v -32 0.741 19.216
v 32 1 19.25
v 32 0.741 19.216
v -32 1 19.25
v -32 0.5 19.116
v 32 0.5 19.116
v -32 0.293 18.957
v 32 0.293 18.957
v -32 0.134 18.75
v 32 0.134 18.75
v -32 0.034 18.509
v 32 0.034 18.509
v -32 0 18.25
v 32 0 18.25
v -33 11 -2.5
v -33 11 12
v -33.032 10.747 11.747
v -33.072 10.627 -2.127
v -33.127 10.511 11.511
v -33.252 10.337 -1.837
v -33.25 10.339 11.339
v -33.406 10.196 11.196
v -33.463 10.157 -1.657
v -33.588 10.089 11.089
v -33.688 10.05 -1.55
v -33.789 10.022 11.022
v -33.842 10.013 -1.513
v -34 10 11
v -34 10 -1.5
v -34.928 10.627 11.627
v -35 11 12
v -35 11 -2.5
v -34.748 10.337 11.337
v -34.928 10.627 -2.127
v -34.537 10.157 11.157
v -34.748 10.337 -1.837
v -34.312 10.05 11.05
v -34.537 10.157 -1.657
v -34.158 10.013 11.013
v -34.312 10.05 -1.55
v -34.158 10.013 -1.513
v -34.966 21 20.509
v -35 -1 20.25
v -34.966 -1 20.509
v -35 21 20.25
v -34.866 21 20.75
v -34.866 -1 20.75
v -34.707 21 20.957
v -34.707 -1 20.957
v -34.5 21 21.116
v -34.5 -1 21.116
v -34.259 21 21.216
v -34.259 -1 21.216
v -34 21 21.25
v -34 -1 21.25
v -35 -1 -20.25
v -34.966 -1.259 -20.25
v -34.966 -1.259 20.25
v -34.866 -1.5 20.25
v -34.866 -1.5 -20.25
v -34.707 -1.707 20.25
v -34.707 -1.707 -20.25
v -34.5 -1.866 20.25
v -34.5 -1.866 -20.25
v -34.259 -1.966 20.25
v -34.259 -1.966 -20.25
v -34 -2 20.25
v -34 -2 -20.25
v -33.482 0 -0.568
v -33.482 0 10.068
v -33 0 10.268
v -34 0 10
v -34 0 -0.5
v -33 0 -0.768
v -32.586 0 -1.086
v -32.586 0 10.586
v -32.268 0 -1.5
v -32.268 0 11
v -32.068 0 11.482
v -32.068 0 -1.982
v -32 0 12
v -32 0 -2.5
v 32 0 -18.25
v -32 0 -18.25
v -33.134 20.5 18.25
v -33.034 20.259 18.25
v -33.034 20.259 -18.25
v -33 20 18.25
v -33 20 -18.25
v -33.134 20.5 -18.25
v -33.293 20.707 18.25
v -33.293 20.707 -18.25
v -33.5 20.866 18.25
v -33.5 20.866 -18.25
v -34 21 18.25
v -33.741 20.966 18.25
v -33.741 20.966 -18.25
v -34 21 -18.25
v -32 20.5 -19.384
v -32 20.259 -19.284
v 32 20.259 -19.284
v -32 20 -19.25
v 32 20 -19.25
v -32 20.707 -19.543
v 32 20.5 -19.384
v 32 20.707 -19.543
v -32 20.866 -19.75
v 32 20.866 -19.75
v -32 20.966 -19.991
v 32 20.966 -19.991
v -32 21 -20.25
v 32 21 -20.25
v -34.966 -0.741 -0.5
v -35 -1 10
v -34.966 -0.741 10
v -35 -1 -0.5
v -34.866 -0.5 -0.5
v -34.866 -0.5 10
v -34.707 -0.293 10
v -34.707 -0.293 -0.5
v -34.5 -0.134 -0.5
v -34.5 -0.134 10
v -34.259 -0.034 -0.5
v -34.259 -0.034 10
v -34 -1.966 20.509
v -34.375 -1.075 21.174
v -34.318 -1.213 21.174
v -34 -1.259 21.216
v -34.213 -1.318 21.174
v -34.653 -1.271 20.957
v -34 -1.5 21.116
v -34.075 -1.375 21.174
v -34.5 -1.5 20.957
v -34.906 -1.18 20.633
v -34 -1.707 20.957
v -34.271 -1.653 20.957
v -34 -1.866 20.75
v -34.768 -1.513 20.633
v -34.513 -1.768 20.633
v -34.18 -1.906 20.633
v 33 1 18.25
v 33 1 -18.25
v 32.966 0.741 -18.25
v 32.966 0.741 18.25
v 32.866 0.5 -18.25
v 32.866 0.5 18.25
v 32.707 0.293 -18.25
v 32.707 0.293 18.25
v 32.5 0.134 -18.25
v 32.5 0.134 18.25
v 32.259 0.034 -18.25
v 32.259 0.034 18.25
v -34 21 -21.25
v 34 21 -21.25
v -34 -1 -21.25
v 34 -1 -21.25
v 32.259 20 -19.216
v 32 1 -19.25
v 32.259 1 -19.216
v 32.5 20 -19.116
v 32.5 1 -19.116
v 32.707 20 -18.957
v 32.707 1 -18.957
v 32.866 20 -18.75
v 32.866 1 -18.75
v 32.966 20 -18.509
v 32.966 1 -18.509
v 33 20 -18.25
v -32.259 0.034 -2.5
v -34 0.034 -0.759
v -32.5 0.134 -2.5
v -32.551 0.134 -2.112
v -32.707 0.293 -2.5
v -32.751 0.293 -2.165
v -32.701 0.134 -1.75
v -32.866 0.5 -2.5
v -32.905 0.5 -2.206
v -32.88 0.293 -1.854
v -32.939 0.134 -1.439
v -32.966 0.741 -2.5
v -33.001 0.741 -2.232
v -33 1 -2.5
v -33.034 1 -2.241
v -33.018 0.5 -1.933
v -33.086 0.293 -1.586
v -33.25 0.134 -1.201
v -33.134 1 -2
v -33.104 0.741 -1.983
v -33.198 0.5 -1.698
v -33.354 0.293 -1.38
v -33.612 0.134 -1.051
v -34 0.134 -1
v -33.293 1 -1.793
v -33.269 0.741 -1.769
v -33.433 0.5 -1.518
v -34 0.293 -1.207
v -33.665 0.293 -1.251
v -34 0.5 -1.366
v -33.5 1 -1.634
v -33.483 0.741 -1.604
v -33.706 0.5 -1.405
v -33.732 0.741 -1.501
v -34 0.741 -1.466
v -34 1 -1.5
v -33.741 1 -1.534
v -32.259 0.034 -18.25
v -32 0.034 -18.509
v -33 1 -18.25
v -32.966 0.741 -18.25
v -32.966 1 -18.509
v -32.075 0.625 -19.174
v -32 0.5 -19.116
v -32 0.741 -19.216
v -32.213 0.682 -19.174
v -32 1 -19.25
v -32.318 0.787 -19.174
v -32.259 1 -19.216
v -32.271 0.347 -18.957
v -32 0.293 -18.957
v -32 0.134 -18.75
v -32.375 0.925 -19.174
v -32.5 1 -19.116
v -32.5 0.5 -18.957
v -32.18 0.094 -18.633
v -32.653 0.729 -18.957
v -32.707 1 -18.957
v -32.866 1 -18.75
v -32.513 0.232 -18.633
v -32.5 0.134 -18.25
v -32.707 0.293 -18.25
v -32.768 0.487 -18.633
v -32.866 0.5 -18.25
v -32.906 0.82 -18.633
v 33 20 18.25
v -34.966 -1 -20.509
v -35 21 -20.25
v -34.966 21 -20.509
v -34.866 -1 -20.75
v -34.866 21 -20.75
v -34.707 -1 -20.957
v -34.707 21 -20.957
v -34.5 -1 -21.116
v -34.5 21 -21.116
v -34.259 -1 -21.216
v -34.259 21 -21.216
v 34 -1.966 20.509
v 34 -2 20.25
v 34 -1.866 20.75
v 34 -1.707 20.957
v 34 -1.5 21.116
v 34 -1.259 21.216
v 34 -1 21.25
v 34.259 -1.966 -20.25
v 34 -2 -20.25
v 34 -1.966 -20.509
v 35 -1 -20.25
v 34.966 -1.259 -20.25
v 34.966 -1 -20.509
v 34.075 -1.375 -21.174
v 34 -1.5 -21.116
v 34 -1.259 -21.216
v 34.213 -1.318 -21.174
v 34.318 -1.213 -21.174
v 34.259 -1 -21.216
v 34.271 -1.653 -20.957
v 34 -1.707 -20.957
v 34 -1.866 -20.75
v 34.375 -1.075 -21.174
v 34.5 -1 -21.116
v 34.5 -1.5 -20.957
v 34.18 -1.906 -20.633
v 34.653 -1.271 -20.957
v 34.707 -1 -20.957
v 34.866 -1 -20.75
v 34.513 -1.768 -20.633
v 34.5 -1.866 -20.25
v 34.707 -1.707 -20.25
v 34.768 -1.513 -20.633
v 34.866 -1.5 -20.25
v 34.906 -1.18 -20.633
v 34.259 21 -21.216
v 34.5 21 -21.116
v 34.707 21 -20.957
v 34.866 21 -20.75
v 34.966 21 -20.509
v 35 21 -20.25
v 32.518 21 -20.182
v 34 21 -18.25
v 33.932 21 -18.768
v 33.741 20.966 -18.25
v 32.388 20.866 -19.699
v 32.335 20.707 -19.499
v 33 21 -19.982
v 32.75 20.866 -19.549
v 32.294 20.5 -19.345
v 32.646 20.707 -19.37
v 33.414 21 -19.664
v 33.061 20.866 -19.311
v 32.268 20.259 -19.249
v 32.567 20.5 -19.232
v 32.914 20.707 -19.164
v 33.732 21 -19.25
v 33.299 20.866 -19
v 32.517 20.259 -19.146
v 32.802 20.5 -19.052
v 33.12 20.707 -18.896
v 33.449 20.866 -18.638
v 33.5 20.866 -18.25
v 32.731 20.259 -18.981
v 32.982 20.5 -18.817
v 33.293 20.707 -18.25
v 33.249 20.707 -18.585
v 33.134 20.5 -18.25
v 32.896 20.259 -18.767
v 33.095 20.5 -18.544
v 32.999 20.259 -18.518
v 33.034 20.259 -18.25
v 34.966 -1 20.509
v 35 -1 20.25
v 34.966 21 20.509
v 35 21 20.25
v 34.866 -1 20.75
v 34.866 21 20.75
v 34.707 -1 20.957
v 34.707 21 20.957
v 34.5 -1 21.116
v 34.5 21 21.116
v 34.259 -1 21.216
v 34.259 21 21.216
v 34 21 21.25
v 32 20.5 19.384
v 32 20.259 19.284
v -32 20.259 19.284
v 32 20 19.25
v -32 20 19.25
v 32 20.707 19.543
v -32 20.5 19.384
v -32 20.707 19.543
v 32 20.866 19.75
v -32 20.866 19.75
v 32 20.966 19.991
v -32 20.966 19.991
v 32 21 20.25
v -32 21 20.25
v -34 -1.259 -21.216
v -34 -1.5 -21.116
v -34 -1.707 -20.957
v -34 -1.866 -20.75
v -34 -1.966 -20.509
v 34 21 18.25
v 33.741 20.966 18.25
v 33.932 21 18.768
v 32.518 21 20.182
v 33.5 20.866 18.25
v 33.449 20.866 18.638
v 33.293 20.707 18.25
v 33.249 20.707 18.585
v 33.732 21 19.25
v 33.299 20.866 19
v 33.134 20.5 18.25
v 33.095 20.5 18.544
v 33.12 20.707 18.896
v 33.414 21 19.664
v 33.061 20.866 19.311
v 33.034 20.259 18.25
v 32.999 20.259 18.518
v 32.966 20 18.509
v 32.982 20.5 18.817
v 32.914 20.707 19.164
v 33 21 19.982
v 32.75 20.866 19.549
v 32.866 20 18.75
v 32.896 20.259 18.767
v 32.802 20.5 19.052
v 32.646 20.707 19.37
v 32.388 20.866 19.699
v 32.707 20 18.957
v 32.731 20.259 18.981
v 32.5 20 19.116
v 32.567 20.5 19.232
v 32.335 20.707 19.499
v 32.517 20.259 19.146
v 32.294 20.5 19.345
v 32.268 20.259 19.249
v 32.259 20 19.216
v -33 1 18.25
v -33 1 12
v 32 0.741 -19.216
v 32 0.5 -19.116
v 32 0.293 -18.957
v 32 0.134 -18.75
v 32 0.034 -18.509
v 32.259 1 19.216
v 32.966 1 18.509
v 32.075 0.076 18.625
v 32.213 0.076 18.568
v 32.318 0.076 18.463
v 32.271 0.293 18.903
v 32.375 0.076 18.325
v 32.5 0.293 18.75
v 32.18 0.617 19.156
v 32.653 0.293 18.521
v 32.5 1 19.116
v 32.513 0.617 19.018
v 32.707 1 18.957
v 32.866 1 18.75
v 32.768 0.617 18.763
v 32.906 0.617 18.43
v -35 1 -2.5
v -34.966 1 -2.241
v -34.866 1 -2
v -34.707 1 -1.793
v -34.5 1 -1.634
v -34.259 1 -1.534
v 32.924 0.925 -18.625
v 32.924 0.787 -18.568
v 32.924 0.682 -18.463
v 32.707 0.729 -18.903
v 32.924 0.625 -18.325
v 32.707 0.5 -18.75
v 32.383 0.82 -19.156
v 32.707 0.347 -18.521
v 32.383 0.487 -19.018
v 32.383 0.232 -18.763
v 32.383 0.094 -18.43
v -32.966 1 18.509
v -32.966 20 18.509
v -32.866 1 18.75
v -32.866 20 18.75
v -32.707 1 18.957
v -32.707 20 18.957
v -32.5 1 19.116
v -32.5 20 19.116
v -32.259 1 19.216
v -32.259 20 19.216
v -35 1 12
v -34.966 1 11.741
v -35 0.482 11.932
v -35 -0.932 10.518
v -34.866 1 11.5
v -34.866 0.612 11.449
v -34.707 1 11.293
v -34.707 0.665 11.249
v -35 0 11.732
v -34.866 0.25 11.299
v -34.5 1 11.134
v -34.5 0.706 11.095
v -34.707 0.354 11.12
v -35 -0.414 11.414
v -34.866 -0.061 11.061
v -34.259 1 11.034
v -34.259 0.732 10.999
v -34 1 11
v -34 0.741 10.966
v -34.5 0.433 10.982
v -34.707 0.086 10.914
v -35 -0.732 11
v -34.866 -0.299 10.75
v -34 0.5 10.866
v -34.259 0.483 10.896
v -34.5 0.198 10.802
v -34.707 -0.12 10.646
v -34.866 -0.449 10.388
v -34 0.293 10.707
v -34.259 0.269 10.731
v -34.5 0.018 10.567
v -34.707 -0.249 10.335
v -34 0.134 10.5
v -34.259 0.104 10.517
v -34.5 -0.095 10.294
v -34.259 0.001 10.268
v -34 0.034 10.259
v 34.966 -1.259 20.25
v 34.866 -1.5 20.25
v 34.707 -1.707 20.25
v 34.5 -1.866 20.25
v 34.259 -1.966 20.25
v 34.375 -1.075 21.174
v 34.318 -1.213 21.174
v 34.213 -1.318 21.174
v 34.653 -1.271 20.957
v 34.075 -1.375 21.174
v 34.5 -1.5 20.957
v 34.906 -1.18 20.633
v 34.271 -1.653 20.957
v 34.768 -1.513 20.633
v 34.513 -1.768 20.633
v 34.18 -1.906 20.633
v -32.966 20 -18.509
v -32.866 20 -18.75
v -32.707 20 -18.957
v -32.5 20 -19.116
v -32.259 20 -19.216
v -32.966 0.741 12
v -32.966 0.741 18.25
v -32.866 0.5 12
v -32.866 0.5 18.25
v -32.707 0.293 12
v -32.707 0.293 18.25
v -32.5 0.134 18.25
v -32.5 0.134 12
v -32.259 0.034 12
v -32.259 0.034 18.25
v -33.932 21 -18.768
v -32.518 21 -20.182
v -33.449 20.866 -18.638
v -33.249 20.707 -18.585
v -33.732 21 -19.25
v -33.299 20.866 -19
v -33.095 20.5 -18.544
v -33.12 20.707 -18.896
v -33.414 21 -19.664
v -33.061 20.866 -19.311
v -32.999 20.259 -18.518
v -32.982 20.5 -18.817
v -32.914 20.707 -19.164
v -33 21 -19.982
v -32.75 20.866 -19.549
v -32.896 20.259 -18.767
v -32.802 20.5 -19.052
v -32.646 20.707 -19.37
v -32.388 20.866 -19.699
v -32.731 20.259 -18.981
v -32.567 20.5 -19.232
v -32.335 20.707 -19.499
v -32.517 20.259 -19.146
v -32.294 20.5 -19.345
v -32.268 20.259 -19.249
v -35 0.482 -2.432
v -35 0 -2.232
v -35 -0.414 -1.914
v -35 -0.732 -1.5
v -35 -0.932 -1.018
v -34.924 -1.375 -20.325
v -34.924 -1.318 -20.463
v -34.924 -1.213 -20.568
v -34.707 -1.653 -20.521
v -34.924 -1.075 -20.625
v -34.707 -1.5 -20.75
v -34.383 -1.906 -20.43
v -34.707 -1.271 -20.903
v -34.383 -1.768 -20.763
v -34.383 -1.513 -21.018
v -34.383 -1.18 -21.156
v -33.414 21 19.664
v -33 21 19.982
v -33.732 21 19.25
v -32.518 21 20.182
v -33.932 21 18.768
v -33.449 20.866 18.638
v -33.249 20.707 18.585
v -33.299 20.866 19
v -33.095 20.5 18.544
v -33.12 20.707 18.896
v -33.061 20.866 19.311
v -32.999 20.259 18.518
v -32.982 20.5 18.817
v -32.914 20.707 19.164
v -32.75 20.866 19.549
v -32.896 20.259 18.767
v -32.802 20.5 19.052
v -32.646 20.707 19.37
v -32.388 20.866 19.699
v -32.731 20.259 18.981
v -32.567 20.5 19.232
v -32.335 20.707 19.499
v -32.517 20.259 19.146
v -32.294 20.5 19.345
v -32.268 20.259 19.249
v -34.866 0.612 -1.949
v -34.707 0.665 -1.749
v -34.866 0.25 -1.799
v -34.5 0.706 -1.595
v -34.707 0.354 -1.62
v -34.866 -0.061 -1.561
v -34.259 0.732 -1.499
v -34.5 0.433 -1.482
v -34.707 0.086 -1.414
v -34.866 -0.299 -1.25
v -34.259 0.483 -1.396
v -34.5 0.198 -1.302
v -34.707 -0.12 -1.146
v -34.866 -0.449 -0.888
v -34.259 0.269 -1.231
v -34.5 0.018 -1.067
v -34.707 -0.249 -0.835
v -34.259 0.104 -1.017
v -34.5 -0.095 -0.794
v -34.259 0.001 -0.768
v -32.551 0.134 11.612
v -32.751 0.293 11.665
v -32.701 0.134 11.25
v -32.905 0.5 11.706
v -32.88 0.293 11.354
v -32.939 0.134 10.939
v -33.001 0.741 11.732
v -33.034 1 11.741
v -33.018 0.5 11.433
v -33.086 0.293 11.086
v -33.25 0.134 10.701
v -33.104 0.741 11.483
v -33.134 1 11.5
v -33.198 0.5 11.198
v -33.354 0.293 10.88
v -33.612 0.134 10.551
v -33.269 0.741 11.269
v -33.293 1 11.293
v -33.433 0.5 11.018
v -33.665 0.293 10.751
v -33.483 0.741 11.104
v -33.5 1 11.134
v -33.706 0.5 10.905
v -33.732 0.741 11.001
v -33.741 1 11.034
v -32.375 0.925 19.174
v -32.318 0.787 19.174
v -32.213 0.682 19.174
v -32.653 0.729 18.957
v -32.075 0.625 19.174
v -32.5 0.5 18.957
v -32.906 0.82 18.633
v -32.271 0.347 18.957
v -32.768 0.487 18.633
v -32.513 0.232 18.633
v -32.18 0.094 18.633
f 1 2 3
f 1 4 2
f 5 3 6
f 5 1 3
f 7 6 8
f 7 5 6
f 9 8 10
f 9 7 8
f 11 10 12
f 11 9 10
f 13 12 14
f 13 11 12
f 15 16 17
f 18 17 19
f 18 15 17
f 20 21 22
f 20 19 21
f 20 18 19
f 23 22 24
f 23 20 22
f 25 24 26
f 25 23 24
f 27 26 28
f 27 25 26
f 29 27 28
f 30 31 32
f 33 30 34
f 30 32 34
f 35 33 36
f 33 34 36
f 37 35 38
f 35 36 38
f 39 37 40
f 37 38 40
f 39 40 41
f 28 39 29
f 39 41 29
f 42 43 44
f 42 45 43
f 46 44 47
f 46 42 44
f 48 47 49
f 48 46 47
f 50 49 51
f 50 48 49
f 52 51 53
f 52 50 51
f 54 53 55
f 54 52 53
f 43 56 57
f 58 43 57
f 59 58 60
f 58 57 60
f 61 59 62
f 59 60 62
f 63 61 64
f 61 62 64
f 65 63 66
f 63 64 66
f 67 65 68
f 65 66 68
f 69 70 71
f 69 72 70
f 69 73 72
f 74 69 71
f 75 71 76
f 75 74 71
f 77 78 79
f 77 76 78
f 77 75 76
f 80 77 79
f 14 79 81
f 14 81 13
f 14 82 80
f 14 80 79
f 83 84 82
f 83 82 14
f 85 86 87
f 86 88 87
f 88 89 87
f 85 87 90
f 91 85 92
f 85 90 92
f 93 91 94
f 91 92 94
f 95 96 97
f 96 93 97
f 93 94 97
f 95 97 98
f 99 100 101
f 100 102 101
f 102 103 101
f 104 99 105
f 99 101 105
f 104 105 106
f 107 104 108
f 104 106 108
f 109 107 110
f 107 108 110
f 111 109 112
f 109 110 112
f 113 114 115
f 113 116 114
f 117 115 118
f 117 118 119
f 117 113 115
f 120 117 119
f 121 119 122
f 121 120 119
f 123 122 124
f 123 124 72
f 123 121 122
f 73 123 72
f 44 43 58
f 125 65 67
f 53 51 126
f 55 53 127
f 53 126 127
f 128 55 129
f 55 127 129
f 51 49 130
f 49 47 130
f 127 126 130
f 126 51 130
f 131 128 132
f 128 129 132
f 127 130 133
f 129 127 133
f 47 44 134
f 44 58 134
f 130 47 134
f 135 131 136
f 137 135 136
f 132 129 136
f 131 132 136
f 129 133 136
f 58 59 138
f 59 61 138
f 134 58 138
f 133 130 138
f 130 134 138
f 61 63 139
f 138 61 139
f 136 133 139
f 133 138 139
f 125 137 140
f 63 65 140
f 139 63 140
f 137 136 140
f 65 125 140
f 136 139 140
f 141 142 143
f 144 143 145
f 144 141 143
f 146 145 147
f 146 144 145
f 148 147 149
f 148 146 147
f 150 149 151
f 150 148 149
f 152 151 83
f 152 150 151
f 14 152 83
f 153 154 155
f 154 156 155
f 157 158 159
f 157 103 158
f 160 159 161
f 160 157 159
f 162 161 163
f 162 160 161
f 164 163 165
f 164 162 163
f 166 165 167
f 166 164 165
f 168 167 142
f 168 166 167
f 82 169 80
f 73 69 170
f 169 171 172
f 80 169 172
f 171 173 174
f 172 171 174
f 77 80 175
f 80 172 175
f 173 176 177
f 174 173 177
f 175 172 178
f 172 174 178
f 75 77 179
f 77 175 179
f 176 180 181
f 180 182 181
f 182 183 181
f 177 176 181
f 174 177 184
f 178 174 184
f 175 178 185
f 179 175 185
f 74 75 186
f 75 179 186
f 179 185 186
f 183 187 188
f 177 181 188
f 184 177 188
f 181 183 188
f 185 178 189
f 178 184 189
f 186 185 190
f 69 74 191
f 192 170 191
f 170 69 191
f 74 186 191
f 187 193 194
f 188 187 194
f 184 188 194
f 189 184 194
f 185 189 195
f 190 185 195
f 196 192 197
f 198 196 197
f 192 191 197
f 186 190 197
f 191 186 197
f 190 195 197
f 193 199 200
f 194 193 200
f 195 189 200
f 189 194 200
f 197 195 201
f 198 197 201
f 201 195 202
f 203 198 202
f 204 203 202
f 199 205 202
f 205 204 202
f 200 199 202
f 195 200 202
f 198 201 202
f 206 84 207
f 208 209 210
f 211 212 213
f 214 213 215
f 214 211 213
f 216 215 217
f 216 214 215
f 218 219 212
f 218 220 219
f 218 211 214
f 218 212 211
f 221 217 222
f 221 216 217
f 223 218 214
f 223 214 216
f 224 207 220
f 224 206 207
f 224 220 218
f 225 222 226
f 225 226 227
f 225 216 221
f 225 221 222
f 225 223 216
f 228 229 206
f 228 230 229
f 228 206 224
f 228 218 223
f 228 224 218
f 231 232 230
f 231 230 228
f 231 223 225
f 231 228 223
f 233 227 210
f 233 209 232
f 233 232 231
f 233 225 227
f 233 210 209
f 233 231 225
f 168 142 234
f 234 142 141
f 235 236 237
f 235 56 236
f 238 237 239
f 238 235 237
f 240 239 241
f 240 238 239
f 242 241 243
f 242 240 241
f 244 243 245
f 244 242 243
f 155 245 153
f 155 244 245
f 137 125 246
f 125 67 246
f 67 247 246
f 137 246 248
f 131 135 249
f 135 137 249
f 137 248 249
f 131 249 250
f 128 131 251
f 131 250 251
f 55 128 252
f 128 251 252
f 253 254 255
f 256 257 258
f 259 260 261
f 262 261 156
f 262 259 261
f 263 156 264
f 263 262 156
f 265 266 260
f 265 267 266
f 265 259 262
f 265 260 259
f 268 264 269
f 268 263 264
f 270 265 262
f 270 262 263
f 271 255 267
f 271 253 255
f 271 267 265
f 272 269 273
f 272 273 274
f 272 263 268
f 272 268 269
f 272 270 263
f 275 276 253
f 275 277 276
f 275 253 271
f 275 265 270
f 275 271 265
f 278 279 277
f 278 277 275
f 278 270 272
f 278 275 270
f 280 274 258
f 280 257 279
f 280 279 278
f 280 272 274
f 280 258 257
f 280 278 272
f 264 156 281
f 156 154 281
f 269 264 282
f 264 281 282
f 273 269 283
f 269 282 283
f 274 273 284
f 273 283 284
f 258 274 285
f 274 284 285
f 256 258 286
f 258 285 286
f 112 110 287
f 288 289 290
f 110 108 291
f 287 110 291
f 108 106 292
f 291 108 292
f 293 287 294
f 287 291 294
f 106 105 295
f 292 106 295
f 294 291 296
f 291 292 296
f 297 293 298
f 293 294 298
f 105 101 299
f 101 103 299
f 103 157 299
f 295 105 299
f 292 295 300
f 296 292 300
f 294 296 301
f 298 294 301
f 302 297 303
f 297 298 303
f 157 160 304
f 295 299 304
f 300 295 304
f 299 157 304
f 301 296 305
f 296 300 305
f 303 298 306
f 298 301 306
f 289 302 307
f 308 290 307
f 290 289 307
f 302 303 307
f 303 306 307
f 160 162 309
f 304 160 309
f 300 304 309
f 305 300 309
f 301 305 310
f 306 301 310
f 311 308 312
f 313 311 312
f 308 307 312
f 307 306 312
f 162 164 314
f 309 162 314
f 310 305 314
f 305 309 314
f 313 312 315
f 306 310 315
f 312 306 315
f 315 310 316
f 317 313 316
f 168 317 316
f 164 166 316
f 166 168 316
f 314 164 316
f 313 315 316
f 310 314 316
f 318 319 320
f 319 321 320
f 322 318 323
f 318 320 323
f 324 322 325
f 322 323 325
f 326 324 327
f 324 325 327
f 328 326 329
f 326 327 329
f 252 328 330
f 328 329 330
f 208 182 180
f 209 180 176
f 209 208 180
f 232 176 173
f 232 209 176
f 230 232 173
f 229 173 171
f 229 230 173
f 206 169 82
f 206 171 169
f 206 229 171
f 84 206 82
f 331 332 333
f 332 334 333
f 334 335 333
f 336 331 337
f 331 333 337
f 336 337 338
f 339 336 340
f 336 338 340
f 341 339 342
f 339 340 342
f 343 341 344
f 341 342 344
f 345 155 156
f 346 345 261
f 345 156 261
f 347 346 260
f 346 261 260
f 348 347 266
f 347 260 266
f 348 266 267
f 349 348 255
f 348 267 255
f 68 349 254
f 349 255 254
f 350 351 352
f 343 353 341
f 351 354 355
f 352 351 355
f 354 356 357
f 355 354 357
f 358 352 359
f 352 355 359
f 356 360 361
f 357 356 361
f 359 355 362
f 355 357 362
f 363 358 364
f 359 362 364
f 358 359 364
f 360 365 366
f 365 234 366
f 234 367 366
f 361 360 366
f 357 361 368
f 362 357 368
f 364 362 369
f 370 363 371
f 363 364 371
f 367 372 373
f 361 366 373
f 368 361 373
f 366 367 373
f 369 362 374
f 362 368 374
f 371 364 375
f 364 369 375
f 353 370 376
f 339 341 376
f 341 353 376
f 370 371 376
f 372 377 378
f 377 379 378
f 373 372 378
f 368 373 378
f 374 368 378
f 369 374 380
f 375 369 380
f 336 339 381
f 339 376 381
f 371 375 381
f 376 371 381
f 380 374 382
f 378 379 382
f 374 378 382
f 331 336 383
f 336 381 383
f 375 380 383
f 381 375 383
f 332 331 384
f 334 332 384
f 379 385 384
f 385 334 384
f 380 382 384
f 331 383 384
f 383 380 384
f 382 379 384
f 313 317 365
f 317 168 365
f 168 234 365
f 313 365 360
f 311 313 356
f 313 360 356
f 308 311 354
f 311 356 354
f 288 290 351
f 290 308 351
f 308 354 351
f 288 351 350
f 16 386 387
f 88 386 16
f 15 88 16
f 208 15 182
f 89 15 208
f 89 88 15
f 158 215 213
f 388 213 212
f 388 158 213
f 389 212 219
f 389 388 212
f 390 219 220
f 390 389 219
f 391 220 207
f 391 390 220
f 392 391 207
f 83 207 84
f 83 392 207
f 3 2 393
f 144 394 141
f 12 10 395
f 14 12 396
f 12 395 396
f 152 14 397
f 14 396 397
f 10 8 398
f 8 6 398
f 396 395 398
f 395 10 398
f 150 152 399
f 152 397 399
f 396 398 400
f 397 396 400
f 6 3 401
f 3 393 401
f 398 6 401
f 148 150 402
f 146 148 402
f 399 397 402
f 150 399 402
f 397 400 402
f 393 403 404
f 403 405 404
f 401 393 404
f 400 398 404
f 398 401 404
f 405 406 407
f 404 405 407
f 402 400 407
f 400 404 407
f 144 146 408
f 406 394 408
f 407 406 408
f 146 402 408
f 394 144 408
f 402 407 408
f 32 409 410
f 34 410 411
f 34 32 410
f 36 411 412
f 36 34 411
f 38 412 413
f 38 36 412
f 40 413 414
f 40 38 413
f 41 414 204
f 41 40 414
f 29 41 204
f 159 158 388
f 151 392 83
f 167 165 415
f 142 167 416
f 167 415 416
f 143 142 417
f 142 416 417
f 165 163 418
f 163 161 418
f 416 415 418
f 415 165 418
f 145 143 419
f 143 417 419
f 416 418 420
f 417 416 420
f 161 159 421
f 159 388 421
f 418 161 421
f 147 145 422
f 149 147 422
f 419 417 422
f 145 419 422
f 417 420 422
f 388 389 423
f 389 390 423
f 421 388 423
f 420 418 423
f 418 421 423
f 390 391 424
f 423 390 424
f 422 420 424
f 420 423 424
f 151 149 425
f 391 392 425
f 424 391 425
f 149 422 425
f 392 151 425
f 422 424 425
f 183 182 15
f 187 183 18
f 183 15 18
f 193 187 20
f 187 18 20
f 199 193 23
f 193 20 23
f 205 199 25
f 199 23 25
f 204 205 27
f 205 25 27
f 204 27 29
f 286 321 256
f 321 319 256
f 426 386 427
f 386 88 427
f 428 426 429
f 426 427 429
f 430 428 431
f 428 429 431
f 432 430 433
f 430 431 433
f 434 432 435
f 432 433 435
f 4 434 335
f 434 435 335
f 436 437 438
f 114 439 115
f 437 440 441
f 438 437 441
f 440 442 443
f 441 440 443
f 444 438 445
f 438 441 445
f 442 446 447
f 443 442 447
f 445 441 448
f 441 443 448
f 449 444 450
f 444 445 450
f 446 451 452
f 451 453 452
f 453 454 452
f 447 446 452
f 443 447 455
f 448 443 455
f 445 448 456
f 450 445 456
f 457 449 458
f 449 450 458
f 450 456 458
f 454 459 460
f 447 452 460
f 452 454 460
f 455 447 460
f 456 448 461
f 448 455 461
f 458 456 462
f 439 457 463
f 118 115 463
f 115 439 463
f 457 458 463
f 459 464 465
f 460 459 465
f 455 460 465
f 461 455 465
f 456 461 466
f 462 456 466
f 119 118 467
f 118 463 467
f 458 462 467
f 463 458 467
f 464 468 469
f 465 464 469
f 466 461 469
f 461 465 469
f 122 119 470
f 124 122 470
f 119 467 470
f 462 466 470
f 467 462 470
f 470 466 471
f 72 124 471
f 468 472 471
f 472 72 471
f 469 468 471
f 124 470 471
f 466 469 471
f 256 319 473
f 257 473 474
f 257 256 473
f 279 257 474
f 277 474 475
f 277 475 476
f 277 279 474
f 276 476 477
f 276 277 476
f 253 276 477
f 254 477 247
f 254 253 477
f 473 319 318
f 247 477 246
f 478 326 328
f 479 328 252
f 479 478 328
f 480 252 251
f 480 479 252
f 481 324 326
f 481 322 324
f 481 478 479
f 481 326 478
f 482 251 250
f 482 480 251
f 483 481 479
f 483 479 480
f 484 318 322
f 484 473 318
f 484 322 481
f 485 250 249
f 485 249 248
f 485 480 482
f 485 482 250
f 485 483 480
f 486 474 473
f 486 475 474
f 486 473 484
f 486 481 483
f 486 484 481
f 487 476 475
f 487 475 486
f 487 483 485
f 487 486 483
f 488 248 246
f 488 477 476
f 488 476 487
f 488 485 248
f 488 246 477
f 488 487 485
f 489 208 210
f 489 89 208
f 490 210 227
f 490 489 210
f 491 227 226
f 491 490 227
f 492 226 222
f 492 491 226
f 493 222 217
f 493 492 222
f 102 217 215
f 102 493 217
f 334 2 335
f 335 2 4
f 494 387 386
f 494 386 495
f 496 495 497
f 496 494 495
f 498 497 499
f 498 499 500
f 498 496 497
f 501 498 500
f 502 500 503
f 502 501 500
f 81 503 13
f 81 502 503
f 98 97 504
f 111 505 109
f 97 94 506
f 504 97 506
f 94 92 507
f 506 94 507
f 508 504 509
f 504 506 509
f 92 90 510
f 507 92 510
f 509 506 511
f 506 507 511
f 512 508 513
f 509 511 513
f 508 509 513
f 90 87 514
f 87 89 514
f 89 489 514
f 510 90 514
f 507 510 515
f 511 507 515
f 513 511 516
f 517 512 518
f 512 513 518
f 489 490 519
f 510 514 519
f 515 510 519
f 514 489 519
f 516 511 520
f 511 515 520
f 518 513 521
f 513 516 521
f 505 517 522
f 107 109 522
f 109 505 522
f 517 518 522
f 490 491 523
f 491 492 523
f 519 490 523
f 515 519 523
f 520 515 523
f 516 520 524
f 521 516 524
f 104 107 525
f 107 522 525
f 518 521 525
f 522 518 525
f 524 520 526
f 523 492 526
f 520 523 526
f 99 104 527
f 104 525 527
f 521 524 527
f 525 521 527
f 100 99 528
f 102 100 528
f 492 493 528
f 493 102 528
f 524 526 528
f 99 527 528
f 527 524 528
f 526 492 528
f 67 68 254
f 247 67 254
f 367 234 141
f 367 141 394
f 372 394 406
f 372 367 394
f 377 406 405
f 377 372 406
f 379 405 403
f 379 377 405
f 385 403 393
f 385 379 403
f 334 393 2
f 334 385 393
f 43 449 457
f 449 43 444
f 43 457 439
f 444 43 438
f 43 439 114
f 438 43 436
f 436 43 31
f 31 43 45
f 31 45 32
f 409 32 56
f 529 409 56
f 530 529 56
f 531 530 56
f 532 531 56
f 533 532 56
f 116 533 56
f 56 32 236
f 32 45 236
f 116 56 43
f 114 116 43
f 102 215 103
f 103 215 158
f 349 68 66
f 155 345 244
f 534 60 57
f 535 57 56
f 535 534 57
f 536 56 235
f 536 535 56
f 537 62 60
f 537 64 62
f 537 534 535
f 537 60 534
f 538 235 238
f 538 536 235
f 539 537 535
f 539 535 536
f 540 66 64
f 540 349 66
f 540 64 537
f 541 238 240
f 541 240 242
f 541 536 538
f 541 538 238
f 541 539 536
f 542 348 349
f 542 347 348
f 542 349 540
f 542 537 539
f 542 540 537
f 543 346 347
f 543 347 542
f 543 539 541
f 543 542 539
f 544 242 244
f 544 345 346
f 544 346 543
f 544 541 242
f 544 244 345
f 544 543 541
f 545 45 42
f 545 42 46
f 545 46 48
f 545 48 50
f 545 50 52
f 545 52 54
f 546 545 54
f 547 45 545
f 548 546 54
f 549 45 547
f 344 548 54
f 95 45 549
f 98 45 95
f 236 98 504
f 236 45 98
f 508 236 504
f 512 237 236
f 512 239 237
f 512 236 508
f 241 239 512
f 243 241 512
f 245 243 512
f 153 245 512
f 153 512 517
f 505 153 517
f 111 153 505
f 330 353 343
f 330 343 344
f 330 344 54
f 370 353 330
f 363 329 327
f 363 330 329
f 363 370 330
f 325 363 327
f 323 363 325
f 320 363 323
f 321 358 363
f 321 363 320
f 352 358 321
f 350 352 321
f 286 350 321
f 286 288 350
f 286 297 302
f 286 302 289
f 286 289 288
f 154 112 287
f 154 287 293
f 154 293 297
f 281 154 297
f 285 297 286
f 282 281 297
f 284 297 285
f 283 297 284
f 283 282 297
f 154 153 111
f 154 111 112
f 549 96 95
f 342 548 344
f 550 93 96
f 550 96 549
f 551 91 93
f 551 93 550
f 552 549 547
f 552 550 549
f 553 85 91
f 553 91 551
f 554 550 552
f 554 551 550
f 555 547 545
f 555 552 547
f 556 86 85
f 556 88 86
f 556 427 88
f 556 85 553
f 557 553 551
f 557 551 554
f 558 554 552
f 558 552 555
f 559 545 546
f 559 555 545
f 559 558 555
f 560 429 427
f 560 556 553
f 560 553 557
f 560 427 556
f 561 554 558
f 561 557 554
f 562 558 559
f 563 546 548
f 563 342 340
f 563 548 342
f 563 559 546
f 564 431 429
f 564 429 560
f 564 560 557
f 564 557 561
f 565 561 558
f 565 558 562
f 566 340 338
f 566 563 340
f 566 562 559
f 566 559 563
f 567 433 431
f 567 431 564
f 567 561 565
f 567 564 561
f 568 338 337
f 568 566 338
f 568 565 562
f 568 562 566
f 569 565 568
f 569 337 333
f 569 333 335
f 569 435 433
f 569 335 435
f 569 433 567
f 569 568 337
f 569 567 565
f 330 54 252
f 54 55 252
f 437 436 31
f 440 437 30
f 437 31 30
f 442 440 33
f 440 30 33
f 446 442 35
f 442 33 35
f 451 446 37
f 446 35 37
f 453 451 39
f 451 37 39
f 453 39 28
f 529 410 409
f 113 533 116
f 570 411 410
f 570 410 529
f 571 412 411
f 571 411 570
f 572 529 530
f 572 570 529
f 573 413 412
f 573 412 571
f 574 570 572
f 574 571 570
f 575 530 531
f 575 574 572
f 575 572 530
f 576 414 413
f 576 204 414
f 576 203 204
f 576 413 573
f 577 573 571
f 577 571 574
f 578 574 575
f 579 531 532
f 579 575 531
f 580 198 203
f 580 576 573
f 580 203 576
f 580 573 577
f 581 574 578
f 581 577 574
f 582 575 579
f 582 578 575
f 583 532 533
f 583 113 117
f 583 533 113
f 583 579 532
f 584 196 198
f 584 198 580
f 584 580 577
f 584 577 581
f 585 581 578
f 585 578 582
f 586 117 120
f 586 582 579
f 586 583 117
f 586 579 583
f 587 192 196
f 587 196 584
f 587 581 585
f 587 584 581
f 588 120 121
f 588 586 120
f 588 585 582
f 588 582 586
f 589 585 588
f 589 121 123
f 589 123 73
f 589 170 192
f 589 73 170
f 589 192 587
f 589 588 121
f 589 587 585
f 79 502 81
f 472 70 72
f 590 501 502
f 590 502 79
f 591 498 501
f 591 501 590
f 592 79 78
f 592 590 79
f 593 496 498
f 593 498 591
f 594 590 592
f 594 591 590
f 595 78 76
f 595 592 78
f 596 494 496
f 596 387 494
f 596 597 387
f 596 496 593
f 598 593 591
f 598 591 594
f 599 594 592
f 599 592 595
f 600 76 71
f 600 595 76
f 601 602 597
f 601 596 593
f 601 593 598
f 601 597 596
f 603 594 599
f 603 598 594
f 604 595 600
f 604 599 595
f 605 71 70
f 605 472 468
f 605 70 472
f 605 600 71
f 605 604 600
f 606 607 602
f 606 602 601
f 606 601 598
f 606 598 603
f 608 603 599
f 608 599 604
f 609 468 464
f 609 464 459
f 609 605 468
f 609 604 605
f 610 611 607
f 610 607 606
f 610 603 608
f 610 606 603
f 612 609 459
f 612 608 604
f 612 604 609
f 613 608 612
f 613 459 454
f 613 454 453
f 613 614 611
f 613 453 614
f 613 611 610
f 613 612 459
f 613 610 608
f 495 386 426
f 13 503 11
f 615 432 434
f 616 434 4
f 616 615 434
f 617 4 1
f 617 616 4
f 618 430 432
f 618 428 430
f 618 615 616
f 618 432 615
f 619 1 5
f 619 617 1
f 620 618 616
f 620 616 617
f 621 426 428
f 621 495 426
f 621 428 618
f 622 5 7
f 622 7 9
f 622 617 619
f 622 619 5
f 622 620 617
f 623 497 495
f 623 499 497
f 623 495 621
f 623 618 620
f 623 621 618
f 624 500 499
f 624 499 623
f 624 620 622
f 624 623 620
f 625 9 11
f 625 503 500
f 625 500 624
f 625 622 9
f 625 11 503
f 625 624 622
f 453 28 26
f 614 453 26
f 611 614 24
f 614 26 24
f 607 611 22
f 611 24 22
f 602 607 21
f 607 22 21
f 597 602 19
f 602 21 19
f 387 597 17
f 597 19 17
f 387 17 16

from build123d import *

# Parameters (mm, degrees)
SKETCH1_W           = 70
SKETCH1_H           = 42.5
BOSS_EXTRUDE1_DEPTH = 2
BOSS_EXTRUDE2_DEPTH = 21
SKETCH3_W           = 2
SKETCH3_H           = 12.5
BOSS_EXTRUDE3_DEPTH = 11
FILLET2_R           = 1


with BuildPart() as part:
    # Sketch1 → Boss-Extrude1 (new body)
    with BuildSketch(Plane(origin=(0, 0, 0), x_dir=(1, 0, 0), z_dir=(0, 1, 0))):
        Rectangle(SKETCH1_W, SKETCH1_H)
    extrude(amount=-BOSS_EXTRUDE1_DEPTH)

    # Sketch2 → Boss-Extrude2 (add)
    with BuildSketch(Plane(origin=(0, 0, 0), x_dir=(-1, 0, 0), z_dir=(0, 1, 0))):
        Polygon((-33, 19.25), (33, 19.25), (33, 11), (35, 11), (35, 21.25), (-35, 21.25), (-35, -21.25), (35, -21.25), (35, -1.5), (33, -1.5), (33, -19.25), (-33, -19.25), align=None)
    extrude(amount=BOSS_EXTRUDE2_DEPTH)

    # Sketch3 → Boss-Extrude3 (add)
    with BuildSketch(Plane(origin=(0, 21, 0), x_dir=(1, 0, 0), z_dir=(0, 1, 0))):
        with Locations((-34, -4.75)):
            Rectangle(SKETCH3_W, SKETCH3_H)
    extrude(amount=-BOSS_EXTRUDE3_DEPTH)

    # Fillet2
    fillet2_edges = [part.edges().sort_by_distance(p)[0] for p in [
        (35, -2, 0),
        (-35, 0, 4.75),
        (0, -2, -21.25),
        (-33, 0, -10.375),
        (0, 0, -19.25),
        (-33, 10.5, -19.25),
        (33, 21, 0),
        (33, 10.5, -19.25),
        (0, 21, 19.25),
        (33, 10.5, 19.25),
        (-33, 0, 15.125),
        (-33, 10.5, 19.25),
        (-34, 0, 11),
        (-33, 21, 0),
        (0, 21, -19.25),
        (-34, 0, -1.5),
        (0, 0, 19.25),
        (33, 0, 0),
        (-35, 5, 11),
        (-33, 5, 11),
        (-33, 5, -1.5),
        (-35, 5, -1.5),
        (-35, -2, 0),
        (-33, 10, 4.75),
        (-35, 10, 4.75),
        (-35, 9.5, -21.25),
        (35, 9.5, -21.25),
        (35, 9.5, 21.25),
        (-35, 9.5, 21.25),
        (0, -2, 21.25),
    ]]
    fillet(fillet2_edges, radius=FILLET2_R - 0.0001)  # a hair under: the kernel refuses the full size


solid = part.part
